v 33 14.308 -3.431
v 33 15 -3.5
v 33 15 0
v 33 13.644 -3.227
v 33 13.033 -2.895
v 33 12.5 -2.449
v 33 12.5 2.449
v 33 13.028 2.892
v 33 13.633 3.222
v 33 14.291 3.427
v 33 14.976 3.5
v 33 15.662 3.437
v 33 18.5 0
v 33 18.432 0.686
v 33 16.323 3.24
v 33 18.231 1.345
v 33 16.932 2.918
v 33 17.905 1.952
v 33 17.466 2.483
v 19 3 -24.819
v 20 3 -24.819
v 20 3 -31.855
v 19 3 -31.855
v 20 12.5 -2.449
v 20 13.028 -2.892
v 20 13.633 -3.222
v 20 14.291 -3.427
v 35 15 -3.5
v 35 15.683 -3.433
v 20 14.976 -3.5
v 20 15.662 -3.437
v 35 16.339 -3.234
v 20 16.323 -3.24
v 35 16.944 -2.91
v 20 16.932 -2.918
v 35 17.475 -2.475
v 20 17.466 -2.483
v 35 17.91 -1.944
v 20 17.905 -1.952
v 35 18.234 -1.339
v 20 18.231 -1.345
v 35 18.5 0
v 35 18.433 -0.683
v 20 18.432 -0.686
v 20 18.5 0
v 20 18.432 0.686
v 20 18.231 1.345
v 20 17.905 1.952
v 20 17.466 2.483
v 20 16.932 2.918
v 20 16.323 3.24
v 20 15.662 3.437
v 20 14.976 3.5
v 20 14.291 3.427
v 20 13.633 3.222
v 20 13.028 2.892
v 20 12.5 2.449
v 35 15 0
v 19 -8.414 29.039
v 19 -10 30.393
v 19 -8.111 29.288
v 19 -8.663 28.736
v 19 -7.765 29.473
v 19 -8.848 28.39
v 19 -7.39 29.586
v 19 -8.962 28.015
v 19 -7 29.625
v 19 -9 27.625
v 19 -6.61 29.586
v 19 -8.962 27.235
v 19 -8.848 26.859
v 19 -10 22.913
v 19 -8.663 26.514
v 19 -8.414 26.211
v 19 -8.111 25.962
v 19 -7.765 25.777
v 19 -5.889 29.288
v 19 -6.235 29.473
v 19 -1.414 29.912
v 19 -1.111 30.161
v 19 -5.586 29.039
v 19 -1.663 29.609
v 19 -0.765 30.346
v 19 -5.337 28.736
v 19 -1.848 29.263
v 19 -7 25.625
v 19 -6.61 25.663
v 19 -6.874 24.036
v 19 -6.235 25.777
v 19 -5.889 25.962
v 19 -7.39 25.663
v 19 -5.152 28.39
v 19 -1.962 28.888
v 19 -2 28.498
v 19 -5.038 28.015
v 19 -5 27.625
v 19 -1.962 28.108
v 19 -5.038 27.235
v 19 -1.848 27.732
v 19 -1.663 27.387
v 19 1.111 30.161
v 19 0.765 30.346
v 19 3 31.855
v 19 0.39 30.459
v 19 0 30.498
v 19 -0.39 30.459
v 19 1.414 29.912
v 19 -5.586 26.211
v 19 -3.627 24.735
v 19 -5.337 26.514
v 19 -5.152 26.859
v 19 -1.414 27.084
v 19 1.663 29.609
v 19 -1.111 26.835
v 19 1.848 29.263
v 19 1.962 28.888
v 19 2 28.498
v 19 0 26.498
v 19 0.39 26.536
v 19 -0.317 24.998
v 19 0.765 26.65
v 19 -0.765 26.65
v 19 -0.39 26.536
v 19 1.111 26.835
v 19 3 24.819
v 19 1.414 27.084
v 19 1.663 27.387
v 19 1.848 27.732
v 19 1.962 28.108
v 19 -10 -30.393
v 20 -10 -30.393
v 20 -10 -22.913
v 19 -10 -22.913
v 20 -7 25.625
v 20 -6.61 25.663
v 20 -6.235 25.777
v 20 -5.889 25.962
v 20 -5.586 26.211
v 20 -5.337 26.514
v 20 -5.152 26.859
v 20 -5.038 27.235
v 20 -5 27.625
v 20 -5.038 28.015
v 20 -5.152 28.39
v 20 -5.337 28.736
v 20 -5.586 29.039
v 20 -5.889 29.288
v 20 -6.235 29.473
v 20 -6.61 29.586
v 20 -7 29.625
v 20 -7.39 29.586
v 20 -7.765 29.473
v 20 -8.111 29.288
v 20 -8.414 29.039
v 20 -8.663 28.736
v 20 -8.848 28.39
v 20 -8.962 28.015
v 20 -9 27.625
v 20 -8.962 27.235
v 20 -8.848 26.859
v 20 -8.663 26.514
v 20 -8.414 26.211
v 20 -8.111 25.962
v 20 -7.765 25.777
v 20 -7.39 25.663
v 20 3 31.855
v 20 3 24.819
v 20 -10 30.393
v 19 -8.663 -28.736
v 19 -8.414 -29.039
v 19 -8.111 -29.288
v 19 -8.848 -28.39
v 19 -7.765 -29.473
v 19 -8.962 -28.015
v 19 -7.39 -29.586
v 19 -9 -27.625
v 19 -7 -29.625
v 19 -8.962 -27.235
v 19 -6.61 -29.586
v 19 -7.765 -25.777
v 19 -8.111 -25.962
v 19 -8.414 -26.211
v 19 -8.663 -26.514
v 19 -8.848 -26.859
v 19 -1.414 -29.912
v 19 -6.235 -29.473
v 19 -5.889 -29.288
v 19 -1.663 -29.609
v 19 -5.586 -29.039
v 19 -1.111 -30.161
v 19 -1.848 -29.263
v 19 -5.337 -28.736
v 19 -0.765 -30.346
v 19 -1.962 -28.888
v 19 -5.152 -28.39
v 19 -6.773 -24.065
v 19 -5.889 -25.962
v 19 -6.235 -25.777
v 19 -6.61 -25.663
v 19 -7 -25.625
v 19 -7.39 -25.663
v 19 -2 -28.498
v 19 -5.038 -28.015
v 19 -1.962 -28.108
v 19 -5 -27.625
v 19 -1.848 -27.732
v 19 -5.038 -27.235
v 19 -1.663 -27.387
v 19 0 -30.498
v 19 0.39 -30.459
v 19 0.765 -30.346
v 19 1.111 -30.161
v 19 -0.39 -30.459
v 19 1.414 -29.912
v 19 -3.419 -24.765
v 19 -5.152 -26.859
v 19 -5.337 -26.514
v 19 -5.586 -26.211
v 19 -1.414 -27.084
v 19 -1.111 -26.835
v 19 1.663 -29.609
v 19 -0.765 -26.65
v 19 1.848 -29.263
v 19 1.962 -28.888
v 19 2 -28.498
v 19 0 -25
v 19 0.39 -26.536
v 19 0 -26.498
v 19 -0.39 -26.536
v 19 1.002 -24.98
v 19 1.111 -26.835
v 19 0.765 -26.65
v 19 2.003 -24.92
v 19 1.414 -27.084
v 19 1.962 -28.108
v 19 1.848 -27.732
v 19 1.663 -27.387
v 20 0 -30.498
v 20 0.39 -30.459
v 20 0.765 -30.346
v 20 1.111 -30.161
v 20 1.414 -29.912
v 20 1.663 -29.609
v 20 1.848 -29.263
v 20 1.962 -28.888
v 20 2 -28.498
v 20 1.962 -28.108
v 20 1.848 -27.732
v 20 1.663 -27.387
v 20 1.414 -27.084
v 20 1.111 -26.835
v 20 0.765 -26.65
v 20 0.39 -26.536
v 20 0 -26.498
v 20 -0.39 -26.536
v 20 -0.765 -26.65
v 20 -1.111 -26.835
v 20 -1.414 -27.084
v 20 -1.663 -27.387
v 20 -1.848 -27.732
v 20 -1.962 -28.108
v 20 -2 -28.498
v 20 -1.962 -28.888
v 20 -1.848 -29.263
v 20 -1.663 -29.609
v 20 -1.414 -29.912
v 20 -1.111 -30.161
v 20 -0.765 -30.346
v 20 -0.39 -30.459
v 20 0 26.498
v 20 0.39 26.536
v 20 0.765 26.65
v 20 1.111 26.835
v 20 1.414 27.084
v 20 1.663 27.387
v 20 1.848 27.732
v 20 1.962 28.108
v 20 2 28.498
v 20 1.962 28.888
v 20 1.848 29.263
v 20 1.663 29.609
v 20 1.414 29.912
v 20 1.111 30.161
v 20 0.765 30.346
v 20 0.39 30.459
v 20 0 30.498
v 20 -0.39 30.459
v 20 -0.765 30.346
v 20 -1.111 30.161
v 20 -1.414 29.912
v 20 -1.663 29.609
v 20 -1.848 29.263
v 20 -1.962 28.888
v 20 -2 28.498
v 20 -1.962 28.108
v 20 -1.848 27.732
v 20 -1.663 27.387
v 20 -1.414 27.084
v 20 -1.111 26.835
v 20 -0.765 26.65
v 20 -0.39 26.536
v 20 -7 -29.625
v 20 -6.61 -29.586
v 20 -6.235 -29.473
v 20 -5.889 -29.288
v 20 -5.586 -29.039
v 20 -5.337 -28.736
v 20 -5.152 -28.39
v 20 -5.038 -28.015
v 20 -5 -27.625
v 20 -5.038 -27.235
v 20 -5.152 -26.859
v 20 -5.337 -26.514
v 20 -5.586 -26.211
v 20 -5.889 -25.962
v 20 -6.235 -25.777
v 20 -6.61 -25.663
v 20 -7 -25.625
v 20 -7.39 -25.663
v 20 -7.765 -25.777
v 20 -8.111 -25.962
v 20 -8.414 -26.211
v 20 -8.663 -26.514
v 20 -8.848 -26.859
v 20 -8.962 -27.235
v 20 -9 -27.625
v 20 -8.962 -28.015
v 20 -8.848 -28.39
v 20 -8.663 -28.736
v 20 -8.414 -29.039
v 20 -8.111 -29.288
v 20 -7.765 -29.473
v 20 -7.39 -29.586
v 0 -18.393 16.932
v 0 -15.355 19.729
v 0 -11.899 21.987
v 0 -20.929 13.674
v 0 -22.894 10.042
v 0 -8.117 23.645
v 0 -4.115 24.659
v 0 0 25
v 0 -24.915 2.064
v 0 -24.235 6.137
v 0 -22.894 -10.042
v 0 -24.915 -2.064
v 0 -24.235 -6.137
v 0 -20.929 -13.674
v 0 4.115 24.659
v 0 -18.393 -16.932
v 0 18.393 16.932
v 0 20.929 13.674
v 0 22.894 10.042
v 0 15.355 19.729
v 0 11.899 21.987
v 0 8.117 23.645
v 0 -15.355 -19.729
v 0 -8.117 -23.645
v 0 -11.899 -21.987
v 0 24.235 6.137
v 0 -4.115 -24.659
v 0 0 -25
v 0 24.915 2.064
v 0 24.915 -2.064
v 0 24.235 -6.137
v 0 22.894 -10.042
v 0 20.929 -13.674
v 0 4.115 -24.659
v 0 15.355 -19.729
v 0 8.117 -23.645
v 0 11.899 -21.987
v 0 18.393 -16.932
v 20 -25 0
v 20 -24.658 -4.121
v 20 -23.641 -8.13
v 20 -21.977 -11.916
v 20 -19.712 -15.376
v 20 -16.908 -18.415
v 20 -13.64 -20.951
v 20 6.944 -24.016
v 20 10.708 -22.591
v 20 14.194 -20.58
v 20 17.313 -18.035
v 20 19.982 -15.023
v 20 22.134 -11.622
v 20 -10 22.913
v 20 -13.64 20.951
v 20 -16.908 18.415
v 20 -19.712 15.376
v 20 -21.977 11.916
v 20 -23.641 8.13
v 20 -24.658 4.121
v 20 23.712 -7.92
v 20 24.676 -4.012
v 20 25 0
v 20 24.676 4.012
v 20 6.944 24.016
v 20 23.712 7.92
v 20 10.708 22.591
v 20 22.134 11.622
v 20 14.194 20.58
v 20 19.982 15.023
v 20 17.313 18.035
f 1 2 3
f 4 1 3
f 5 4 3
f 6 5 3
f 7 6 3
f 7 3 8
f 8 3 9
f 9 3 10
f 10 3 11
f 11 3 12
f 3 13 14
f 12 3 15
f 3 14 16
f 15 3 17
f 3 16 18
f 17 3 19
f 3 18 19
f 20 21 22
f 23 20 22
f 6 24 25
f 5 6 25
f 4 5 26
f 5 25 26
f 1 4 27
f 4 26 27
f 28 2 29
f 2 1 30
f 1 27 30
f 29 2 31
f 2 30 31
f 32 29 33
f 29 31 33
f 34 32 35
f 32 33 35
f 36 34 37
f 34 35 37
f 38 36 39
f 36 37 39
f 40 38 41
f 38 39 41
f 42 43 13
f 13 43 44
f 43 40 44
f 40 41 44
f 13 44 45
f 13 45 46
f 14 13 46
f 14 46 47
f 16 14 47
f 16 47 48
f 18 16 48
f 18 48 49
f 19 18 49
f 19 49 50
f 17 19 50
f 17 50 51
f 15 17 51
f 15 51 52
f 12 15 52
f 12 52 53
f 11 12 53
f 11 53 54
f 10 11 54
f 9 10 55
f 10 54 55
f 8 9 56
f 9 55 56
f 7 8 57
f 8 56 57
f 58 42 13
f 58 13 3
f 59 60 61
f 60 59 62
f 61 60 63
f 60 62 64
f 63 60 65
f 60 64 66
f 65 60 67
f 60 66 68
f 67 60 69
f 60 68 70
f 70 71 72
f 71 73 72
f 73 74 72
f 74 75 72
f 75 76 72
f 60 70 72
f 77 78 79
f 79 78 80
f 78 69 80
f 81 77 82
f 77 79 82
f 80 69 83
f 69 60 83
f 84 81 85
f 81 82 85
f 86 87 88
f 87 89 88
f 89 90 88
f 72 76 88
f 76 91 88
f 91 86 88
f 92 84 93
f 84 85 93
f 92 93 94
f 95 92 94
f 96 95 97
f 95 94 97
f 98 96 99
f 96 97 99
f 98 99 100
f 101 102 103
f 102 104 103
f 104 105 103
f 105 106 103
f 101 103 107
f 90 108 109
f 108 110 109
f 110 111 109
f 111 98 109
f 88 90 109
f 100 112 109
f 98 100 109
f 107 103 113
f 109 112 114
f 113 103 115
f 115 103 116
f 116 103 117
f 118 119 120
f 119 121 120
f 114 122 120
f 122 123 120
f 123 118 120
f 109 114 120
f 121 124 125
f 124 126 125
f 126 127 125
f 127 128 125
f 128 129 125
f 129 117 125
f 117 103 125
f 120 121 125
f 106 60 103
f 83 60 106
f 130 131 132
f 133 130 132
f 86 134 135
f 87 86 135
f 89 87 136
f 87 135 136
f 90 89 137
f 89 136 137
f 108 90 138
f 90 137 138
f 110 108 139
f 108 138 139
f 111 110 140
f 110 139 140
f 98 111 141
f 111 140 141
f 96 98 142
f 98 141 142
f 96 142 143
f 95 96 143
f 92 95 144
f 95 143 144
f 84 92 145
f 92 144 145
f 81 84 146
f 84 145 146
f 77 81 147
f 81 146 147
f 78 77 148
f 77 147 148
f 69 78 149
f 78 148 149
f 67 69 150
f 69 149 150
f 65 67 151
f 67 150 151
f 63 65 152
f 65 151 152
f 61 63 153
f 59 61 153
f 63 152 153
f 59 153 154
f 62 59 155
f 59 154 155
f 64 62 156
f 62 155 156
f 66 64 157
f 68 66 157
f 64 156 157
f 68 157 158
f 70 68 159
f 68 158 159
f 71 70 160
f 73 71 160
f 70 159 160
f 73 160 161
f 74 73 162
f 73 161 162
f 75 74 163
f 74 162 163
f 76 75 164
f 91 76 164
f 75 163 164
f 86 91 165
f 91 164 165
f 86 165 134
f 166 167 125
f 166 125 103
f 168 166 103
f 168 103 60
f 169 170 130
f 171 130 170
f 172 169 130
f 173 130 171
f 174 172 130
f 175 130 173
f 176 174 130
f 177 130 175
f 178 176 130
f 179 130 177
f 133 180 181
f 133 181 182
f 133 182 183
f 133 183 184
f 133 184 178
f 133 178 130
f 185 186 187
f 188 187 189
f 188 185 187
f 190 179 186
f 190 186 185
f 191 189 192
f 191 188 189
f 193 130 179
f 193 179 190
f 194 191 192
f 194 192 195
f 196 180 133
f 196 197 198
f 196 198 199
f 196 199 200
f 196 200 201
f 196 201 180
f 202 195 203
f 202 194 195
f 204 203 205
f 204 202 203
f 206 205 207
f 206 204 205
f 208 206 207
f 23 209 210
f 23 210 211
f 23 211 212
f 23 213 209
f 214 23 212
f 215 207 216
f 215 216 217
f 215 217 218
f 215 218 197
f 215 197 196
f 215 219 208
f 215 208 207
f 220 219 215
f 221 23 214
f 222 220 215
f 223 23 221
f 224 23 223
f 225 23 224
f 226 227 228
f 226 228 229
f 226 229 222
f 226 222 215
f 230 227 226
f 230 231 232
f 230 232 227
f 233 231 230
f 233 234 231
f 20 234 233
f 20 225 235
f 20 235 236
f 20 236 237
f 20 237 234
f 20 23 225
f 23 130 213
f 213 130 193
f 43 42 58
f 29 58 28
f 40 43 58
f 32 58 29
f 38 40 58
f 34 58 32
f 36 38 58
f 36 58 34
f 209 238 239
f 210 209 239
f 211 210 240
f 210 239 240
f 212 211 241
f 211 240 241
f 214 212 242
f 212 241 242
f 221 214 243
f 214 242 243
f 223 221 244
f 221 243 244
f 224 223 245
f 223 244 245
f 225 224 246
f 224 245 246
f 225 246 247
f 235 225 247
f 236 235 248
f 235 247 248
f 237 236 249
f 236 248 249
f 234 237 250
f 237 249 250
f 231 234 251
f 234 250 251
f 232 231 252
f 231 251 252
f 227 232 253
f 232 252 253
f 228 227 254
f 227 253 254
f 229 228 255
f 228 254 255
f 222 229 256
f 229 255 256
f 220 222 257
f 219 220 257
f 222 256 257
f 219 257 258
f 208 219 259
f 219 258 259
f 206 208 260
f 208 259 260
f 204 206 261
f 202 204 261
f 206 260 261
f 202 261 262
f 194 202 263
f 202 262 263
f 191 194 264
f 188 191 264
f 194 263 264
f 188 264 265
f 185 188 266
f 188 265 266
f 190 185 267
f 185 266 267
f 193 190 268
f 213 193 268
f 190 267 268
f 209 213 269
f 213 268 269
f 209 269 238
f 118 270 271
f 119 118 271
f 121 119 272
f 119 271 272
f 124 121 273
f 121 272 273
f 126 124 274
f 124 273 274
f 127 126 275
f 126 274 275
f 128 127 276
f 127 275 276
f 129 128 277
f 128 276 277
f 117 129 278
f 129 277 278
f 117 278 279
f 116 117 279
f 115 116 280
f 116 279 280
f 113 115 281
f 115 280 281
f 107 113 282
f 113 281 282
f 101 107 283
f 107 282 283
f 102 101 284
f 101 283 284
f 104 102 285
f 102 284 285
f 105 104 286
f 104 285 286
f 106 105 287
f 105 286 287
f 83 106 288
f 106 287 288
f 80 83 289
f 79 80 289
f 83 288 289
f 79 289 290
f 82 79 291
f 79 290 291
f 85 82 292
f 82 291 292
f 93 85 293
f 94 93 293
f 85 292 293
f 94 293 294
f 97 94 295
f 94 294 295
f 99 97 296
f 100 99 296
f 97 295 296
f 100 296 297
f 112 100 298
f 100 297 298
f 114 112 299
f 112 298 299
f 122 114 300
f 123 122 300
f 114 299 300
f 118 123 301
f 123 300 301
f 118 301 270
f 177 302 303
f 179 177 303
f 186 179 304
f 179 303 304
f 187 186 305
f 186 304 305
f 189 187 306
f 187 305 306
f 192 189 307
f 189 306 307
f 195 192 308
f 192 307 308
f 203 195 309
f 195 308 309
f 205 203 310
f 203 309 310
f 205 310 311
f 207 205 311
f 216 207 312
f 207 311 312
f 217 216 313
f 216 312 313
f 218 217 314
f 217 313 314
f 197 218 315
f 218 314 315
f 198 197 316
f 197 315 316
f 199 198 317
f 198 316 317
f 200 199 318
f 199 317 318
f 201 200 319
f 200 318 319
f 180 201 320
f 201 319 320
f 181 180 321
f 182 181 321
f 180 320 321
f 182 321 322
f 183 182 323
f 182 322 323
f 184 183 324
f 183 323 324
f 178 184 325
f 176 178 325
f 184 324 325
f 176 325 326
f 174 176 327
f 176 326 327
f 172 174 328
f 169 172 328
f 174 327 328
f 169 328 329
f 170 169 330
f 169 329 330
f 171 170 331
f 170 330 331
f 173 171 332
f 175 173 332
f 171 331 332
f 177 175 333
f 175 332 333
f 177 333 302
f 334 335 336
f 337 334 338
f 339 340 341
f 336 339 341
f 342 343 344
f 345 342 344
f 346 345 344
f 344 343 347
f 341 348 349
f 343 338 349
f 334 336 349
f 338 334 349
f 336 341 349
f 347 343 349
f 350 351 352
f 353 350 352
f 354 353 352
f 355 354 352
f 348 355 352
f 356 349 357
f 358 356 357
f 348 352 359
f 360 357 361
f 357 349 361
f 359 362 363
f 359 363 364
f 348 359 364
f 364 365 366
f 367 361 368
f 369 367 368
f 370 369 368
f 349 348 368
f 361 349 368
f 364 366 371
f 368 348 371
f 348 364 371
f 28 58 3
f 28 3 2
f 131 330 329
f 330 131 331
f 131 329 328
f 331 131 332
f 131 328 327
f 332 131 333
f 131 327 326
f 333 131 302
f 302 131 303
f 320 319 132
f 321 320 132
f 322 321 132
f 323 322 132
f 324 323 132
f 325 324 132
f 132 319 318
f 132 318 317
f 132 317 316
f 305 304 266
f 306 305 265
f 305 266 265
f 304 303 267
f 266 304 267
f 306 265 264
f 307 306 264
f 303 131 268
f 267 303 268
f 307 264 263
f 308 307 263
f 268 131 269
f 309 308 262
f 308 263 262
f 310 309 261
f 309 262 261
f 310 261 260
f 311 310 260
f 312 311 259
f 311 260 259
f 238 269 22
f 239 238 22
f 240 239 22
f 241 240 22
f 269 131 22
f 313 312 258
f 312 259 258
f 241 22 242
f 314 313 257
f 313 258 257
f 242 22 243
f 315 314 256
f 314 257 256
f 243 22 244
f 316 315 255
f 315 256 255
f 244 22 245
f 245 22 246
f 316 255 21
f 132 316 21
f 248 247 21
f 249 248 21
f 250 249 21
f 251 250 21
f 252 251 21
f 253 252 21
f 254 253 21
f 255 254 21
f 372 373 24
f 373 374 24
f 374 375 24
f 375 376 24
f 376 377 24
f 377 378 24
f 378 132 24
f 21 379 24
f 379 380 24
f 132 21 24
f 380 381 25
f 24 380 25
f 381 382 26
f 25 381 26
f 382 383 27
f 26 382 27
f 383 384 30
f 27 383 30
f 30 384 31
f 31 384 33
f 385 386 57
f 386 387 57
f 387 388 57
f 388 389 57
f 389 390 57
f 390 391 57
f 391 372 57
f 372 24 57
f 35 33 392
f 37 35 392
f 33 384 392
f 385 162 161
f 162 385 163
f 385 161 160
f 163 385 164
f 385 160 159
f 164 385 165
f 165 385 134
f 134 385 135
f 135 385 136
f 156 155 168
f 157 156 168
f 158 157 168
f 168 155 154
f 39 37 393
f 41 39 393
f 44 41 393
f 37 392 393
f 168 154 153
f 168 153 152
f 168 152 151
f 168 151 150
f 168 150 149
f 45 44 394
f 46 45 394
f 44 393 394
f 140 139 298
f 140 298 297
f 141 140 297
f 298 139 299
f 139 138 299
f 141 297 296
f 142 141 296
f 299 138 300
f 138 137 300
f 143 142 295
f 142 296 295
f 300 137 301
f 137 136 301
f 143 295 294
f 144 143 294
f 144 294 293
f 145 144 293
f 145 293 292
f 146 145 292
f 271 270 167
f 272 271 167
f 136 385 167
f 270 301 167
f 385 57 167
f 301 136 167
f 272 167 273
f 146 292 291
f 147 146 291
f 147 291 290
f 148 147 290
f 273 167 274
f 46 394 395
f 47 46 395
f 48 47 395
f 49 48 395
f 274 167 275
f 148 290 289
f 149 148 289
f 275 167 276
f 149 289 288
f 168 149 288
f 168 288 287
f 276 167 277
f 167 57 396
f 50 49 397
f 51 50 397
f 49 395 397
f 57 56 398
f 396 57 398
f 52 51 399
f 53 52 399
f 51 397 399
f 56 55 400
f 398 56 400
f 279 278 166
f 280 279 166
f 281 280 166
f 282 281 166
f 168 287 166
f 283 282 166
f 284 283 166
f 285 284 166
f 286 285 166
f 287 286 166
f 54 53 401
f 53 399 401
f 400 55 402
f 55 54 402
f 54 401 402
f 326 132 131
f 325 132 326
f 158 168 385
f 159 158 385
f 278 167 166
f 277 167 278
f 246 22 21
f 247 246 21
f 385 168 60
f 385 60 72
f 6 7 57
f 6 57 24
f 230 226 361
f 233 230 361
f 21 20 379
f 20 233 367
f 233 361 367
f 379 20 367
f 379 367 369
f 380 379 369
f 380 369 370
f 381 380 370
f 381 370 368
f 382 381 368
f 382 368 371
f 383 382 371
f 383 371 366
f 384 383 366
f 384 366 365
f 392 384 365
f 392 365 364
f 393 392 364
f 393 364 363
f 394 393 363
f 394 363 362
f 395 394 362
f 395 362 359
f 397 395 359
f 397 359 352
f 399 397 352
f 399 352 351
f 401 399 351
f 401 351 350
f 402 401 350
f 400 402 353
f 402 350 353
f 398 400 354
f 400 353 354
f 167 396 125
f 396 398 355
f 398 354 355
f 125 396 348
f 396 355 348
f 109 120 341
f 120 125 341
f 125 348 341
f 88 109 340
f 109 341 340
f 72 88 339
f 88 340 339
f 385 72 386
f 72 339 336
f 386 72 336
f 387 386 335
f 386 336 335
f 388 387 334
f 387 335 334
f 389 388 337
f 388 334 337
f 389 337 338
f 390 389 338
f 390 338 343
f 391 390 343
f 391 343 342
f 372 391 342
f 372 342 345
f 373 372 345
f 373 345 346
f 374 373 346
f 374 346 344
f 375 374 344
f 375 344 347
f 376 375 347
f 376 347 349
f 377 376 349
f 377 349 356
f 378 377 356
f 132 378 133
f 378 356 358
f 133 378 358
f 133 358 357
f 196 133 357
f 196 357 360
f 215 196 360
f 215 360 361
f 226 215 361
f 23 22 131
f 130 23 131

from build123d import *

# Parameters (mm, degrees)
SKETCH1_R           = 25
BOSS_EXTRUDE1_DEPTH = 20
BOSS_EXTRUDE2_DEPTH = 15
SKETCH3_R           = 2
BOSS_EXTRUDE3_DEPTH = 1
CUT_EXTRUDE1_DEPTH  = 2


with BuildPart() as part:
    # Sketch1 → Boss-Extrude1 (new body)
    with BuildSketch(Plane(origin=(0, 0, 0), x_dir=(0, 0, -1), z_dir=(1, 0, 0))):
        Circle(SKETCH1_R)
    extrude(amount=BOSS_EXTRUDE1_DEPTH)

    # Sketch2 → Boss-Extrude2 (add)
    with BuildSketch(Plane(origin=(20, 0, 0), x_dir=(0, 0, -1), z_dir=(1, 0, 0))):
        with BuildLine():
            Line((-2.449489743, 12.5), (2.449489743, 12.5))
            ThreePointArc((2.449489743, 12.5), (0, 18.5), (-2.449489743, 12.5))
        make_face()
    extrude(amount=BOSS_EXTRUDE2_DEPTH)

    # Sketch3 → Boss-Extrude3 (add)
    with BuildSketch(Plane(origin=(20, 0, 0), x_dir=(0, 0, -1), z_dir=(1, 0, 0))):
        with BuildLine():
            Line((-31.854729385, 3), (-30.392824551, -10))
            Line((-30.392824551, -10), (-22.912878475, -10))
            ThreePointArc((-22.912878475, -10), (-24.735426905, -3.62748616), (-24.819347292, 3))
            Line((-24.819347292, 3), (-31.854729385, 3))
        make_face()
        with Locations((-28.497841918, 0)):
            Circle(SKETCH3_R, mode=Mode.SUBTRACT)
        with Locations((-27.624753284, -7)):
            Circle(SKETCH3_R, mode=Mode.SUBTRACT)
        with BuildLine():
            Line((31.854729385, 3), (30.392824551, -10))
            Line((30.392824551, -10), (22.912878475, -10))
            ThreePointArc((22.912878475, -10), (24.735426905, -3.62748616), (24.819347292, 3))
            Line((24.819347292, 3), (31.854729385, 3))
        make_face()
        with Locations((27.624753284, -7)):
            Circle(SKETCH3_R, mode=Mode.SUBTRACT)
        with Locations((28.497841918, 0)):
            Circle(SKETCH3_R, mode=Mode.SUBTRACT)
    extrude(amount=-BOSS_EXTRUDE3_DEPTH)

    # Sketch4 → Cut-Extrude1 (cut)
    with BuildSketch(Plane(origin=(35, 0, 0), x_dir=(0, 0, -1), z_dir=(1, 0, 0))):
        with BuildLine():
            Line((0, 15), (3.5, 15))
            ThreePointArc((3.5, 15), (-2.474873734, 12.525126266), (0, 18.5))
            Line((0, 18.5), (0, 15))
        make_face()
    extrude(amount=-CUT_EXTRUDE1_DEPTH, mode=Mode.SUBTRACT)


solid = part.part
